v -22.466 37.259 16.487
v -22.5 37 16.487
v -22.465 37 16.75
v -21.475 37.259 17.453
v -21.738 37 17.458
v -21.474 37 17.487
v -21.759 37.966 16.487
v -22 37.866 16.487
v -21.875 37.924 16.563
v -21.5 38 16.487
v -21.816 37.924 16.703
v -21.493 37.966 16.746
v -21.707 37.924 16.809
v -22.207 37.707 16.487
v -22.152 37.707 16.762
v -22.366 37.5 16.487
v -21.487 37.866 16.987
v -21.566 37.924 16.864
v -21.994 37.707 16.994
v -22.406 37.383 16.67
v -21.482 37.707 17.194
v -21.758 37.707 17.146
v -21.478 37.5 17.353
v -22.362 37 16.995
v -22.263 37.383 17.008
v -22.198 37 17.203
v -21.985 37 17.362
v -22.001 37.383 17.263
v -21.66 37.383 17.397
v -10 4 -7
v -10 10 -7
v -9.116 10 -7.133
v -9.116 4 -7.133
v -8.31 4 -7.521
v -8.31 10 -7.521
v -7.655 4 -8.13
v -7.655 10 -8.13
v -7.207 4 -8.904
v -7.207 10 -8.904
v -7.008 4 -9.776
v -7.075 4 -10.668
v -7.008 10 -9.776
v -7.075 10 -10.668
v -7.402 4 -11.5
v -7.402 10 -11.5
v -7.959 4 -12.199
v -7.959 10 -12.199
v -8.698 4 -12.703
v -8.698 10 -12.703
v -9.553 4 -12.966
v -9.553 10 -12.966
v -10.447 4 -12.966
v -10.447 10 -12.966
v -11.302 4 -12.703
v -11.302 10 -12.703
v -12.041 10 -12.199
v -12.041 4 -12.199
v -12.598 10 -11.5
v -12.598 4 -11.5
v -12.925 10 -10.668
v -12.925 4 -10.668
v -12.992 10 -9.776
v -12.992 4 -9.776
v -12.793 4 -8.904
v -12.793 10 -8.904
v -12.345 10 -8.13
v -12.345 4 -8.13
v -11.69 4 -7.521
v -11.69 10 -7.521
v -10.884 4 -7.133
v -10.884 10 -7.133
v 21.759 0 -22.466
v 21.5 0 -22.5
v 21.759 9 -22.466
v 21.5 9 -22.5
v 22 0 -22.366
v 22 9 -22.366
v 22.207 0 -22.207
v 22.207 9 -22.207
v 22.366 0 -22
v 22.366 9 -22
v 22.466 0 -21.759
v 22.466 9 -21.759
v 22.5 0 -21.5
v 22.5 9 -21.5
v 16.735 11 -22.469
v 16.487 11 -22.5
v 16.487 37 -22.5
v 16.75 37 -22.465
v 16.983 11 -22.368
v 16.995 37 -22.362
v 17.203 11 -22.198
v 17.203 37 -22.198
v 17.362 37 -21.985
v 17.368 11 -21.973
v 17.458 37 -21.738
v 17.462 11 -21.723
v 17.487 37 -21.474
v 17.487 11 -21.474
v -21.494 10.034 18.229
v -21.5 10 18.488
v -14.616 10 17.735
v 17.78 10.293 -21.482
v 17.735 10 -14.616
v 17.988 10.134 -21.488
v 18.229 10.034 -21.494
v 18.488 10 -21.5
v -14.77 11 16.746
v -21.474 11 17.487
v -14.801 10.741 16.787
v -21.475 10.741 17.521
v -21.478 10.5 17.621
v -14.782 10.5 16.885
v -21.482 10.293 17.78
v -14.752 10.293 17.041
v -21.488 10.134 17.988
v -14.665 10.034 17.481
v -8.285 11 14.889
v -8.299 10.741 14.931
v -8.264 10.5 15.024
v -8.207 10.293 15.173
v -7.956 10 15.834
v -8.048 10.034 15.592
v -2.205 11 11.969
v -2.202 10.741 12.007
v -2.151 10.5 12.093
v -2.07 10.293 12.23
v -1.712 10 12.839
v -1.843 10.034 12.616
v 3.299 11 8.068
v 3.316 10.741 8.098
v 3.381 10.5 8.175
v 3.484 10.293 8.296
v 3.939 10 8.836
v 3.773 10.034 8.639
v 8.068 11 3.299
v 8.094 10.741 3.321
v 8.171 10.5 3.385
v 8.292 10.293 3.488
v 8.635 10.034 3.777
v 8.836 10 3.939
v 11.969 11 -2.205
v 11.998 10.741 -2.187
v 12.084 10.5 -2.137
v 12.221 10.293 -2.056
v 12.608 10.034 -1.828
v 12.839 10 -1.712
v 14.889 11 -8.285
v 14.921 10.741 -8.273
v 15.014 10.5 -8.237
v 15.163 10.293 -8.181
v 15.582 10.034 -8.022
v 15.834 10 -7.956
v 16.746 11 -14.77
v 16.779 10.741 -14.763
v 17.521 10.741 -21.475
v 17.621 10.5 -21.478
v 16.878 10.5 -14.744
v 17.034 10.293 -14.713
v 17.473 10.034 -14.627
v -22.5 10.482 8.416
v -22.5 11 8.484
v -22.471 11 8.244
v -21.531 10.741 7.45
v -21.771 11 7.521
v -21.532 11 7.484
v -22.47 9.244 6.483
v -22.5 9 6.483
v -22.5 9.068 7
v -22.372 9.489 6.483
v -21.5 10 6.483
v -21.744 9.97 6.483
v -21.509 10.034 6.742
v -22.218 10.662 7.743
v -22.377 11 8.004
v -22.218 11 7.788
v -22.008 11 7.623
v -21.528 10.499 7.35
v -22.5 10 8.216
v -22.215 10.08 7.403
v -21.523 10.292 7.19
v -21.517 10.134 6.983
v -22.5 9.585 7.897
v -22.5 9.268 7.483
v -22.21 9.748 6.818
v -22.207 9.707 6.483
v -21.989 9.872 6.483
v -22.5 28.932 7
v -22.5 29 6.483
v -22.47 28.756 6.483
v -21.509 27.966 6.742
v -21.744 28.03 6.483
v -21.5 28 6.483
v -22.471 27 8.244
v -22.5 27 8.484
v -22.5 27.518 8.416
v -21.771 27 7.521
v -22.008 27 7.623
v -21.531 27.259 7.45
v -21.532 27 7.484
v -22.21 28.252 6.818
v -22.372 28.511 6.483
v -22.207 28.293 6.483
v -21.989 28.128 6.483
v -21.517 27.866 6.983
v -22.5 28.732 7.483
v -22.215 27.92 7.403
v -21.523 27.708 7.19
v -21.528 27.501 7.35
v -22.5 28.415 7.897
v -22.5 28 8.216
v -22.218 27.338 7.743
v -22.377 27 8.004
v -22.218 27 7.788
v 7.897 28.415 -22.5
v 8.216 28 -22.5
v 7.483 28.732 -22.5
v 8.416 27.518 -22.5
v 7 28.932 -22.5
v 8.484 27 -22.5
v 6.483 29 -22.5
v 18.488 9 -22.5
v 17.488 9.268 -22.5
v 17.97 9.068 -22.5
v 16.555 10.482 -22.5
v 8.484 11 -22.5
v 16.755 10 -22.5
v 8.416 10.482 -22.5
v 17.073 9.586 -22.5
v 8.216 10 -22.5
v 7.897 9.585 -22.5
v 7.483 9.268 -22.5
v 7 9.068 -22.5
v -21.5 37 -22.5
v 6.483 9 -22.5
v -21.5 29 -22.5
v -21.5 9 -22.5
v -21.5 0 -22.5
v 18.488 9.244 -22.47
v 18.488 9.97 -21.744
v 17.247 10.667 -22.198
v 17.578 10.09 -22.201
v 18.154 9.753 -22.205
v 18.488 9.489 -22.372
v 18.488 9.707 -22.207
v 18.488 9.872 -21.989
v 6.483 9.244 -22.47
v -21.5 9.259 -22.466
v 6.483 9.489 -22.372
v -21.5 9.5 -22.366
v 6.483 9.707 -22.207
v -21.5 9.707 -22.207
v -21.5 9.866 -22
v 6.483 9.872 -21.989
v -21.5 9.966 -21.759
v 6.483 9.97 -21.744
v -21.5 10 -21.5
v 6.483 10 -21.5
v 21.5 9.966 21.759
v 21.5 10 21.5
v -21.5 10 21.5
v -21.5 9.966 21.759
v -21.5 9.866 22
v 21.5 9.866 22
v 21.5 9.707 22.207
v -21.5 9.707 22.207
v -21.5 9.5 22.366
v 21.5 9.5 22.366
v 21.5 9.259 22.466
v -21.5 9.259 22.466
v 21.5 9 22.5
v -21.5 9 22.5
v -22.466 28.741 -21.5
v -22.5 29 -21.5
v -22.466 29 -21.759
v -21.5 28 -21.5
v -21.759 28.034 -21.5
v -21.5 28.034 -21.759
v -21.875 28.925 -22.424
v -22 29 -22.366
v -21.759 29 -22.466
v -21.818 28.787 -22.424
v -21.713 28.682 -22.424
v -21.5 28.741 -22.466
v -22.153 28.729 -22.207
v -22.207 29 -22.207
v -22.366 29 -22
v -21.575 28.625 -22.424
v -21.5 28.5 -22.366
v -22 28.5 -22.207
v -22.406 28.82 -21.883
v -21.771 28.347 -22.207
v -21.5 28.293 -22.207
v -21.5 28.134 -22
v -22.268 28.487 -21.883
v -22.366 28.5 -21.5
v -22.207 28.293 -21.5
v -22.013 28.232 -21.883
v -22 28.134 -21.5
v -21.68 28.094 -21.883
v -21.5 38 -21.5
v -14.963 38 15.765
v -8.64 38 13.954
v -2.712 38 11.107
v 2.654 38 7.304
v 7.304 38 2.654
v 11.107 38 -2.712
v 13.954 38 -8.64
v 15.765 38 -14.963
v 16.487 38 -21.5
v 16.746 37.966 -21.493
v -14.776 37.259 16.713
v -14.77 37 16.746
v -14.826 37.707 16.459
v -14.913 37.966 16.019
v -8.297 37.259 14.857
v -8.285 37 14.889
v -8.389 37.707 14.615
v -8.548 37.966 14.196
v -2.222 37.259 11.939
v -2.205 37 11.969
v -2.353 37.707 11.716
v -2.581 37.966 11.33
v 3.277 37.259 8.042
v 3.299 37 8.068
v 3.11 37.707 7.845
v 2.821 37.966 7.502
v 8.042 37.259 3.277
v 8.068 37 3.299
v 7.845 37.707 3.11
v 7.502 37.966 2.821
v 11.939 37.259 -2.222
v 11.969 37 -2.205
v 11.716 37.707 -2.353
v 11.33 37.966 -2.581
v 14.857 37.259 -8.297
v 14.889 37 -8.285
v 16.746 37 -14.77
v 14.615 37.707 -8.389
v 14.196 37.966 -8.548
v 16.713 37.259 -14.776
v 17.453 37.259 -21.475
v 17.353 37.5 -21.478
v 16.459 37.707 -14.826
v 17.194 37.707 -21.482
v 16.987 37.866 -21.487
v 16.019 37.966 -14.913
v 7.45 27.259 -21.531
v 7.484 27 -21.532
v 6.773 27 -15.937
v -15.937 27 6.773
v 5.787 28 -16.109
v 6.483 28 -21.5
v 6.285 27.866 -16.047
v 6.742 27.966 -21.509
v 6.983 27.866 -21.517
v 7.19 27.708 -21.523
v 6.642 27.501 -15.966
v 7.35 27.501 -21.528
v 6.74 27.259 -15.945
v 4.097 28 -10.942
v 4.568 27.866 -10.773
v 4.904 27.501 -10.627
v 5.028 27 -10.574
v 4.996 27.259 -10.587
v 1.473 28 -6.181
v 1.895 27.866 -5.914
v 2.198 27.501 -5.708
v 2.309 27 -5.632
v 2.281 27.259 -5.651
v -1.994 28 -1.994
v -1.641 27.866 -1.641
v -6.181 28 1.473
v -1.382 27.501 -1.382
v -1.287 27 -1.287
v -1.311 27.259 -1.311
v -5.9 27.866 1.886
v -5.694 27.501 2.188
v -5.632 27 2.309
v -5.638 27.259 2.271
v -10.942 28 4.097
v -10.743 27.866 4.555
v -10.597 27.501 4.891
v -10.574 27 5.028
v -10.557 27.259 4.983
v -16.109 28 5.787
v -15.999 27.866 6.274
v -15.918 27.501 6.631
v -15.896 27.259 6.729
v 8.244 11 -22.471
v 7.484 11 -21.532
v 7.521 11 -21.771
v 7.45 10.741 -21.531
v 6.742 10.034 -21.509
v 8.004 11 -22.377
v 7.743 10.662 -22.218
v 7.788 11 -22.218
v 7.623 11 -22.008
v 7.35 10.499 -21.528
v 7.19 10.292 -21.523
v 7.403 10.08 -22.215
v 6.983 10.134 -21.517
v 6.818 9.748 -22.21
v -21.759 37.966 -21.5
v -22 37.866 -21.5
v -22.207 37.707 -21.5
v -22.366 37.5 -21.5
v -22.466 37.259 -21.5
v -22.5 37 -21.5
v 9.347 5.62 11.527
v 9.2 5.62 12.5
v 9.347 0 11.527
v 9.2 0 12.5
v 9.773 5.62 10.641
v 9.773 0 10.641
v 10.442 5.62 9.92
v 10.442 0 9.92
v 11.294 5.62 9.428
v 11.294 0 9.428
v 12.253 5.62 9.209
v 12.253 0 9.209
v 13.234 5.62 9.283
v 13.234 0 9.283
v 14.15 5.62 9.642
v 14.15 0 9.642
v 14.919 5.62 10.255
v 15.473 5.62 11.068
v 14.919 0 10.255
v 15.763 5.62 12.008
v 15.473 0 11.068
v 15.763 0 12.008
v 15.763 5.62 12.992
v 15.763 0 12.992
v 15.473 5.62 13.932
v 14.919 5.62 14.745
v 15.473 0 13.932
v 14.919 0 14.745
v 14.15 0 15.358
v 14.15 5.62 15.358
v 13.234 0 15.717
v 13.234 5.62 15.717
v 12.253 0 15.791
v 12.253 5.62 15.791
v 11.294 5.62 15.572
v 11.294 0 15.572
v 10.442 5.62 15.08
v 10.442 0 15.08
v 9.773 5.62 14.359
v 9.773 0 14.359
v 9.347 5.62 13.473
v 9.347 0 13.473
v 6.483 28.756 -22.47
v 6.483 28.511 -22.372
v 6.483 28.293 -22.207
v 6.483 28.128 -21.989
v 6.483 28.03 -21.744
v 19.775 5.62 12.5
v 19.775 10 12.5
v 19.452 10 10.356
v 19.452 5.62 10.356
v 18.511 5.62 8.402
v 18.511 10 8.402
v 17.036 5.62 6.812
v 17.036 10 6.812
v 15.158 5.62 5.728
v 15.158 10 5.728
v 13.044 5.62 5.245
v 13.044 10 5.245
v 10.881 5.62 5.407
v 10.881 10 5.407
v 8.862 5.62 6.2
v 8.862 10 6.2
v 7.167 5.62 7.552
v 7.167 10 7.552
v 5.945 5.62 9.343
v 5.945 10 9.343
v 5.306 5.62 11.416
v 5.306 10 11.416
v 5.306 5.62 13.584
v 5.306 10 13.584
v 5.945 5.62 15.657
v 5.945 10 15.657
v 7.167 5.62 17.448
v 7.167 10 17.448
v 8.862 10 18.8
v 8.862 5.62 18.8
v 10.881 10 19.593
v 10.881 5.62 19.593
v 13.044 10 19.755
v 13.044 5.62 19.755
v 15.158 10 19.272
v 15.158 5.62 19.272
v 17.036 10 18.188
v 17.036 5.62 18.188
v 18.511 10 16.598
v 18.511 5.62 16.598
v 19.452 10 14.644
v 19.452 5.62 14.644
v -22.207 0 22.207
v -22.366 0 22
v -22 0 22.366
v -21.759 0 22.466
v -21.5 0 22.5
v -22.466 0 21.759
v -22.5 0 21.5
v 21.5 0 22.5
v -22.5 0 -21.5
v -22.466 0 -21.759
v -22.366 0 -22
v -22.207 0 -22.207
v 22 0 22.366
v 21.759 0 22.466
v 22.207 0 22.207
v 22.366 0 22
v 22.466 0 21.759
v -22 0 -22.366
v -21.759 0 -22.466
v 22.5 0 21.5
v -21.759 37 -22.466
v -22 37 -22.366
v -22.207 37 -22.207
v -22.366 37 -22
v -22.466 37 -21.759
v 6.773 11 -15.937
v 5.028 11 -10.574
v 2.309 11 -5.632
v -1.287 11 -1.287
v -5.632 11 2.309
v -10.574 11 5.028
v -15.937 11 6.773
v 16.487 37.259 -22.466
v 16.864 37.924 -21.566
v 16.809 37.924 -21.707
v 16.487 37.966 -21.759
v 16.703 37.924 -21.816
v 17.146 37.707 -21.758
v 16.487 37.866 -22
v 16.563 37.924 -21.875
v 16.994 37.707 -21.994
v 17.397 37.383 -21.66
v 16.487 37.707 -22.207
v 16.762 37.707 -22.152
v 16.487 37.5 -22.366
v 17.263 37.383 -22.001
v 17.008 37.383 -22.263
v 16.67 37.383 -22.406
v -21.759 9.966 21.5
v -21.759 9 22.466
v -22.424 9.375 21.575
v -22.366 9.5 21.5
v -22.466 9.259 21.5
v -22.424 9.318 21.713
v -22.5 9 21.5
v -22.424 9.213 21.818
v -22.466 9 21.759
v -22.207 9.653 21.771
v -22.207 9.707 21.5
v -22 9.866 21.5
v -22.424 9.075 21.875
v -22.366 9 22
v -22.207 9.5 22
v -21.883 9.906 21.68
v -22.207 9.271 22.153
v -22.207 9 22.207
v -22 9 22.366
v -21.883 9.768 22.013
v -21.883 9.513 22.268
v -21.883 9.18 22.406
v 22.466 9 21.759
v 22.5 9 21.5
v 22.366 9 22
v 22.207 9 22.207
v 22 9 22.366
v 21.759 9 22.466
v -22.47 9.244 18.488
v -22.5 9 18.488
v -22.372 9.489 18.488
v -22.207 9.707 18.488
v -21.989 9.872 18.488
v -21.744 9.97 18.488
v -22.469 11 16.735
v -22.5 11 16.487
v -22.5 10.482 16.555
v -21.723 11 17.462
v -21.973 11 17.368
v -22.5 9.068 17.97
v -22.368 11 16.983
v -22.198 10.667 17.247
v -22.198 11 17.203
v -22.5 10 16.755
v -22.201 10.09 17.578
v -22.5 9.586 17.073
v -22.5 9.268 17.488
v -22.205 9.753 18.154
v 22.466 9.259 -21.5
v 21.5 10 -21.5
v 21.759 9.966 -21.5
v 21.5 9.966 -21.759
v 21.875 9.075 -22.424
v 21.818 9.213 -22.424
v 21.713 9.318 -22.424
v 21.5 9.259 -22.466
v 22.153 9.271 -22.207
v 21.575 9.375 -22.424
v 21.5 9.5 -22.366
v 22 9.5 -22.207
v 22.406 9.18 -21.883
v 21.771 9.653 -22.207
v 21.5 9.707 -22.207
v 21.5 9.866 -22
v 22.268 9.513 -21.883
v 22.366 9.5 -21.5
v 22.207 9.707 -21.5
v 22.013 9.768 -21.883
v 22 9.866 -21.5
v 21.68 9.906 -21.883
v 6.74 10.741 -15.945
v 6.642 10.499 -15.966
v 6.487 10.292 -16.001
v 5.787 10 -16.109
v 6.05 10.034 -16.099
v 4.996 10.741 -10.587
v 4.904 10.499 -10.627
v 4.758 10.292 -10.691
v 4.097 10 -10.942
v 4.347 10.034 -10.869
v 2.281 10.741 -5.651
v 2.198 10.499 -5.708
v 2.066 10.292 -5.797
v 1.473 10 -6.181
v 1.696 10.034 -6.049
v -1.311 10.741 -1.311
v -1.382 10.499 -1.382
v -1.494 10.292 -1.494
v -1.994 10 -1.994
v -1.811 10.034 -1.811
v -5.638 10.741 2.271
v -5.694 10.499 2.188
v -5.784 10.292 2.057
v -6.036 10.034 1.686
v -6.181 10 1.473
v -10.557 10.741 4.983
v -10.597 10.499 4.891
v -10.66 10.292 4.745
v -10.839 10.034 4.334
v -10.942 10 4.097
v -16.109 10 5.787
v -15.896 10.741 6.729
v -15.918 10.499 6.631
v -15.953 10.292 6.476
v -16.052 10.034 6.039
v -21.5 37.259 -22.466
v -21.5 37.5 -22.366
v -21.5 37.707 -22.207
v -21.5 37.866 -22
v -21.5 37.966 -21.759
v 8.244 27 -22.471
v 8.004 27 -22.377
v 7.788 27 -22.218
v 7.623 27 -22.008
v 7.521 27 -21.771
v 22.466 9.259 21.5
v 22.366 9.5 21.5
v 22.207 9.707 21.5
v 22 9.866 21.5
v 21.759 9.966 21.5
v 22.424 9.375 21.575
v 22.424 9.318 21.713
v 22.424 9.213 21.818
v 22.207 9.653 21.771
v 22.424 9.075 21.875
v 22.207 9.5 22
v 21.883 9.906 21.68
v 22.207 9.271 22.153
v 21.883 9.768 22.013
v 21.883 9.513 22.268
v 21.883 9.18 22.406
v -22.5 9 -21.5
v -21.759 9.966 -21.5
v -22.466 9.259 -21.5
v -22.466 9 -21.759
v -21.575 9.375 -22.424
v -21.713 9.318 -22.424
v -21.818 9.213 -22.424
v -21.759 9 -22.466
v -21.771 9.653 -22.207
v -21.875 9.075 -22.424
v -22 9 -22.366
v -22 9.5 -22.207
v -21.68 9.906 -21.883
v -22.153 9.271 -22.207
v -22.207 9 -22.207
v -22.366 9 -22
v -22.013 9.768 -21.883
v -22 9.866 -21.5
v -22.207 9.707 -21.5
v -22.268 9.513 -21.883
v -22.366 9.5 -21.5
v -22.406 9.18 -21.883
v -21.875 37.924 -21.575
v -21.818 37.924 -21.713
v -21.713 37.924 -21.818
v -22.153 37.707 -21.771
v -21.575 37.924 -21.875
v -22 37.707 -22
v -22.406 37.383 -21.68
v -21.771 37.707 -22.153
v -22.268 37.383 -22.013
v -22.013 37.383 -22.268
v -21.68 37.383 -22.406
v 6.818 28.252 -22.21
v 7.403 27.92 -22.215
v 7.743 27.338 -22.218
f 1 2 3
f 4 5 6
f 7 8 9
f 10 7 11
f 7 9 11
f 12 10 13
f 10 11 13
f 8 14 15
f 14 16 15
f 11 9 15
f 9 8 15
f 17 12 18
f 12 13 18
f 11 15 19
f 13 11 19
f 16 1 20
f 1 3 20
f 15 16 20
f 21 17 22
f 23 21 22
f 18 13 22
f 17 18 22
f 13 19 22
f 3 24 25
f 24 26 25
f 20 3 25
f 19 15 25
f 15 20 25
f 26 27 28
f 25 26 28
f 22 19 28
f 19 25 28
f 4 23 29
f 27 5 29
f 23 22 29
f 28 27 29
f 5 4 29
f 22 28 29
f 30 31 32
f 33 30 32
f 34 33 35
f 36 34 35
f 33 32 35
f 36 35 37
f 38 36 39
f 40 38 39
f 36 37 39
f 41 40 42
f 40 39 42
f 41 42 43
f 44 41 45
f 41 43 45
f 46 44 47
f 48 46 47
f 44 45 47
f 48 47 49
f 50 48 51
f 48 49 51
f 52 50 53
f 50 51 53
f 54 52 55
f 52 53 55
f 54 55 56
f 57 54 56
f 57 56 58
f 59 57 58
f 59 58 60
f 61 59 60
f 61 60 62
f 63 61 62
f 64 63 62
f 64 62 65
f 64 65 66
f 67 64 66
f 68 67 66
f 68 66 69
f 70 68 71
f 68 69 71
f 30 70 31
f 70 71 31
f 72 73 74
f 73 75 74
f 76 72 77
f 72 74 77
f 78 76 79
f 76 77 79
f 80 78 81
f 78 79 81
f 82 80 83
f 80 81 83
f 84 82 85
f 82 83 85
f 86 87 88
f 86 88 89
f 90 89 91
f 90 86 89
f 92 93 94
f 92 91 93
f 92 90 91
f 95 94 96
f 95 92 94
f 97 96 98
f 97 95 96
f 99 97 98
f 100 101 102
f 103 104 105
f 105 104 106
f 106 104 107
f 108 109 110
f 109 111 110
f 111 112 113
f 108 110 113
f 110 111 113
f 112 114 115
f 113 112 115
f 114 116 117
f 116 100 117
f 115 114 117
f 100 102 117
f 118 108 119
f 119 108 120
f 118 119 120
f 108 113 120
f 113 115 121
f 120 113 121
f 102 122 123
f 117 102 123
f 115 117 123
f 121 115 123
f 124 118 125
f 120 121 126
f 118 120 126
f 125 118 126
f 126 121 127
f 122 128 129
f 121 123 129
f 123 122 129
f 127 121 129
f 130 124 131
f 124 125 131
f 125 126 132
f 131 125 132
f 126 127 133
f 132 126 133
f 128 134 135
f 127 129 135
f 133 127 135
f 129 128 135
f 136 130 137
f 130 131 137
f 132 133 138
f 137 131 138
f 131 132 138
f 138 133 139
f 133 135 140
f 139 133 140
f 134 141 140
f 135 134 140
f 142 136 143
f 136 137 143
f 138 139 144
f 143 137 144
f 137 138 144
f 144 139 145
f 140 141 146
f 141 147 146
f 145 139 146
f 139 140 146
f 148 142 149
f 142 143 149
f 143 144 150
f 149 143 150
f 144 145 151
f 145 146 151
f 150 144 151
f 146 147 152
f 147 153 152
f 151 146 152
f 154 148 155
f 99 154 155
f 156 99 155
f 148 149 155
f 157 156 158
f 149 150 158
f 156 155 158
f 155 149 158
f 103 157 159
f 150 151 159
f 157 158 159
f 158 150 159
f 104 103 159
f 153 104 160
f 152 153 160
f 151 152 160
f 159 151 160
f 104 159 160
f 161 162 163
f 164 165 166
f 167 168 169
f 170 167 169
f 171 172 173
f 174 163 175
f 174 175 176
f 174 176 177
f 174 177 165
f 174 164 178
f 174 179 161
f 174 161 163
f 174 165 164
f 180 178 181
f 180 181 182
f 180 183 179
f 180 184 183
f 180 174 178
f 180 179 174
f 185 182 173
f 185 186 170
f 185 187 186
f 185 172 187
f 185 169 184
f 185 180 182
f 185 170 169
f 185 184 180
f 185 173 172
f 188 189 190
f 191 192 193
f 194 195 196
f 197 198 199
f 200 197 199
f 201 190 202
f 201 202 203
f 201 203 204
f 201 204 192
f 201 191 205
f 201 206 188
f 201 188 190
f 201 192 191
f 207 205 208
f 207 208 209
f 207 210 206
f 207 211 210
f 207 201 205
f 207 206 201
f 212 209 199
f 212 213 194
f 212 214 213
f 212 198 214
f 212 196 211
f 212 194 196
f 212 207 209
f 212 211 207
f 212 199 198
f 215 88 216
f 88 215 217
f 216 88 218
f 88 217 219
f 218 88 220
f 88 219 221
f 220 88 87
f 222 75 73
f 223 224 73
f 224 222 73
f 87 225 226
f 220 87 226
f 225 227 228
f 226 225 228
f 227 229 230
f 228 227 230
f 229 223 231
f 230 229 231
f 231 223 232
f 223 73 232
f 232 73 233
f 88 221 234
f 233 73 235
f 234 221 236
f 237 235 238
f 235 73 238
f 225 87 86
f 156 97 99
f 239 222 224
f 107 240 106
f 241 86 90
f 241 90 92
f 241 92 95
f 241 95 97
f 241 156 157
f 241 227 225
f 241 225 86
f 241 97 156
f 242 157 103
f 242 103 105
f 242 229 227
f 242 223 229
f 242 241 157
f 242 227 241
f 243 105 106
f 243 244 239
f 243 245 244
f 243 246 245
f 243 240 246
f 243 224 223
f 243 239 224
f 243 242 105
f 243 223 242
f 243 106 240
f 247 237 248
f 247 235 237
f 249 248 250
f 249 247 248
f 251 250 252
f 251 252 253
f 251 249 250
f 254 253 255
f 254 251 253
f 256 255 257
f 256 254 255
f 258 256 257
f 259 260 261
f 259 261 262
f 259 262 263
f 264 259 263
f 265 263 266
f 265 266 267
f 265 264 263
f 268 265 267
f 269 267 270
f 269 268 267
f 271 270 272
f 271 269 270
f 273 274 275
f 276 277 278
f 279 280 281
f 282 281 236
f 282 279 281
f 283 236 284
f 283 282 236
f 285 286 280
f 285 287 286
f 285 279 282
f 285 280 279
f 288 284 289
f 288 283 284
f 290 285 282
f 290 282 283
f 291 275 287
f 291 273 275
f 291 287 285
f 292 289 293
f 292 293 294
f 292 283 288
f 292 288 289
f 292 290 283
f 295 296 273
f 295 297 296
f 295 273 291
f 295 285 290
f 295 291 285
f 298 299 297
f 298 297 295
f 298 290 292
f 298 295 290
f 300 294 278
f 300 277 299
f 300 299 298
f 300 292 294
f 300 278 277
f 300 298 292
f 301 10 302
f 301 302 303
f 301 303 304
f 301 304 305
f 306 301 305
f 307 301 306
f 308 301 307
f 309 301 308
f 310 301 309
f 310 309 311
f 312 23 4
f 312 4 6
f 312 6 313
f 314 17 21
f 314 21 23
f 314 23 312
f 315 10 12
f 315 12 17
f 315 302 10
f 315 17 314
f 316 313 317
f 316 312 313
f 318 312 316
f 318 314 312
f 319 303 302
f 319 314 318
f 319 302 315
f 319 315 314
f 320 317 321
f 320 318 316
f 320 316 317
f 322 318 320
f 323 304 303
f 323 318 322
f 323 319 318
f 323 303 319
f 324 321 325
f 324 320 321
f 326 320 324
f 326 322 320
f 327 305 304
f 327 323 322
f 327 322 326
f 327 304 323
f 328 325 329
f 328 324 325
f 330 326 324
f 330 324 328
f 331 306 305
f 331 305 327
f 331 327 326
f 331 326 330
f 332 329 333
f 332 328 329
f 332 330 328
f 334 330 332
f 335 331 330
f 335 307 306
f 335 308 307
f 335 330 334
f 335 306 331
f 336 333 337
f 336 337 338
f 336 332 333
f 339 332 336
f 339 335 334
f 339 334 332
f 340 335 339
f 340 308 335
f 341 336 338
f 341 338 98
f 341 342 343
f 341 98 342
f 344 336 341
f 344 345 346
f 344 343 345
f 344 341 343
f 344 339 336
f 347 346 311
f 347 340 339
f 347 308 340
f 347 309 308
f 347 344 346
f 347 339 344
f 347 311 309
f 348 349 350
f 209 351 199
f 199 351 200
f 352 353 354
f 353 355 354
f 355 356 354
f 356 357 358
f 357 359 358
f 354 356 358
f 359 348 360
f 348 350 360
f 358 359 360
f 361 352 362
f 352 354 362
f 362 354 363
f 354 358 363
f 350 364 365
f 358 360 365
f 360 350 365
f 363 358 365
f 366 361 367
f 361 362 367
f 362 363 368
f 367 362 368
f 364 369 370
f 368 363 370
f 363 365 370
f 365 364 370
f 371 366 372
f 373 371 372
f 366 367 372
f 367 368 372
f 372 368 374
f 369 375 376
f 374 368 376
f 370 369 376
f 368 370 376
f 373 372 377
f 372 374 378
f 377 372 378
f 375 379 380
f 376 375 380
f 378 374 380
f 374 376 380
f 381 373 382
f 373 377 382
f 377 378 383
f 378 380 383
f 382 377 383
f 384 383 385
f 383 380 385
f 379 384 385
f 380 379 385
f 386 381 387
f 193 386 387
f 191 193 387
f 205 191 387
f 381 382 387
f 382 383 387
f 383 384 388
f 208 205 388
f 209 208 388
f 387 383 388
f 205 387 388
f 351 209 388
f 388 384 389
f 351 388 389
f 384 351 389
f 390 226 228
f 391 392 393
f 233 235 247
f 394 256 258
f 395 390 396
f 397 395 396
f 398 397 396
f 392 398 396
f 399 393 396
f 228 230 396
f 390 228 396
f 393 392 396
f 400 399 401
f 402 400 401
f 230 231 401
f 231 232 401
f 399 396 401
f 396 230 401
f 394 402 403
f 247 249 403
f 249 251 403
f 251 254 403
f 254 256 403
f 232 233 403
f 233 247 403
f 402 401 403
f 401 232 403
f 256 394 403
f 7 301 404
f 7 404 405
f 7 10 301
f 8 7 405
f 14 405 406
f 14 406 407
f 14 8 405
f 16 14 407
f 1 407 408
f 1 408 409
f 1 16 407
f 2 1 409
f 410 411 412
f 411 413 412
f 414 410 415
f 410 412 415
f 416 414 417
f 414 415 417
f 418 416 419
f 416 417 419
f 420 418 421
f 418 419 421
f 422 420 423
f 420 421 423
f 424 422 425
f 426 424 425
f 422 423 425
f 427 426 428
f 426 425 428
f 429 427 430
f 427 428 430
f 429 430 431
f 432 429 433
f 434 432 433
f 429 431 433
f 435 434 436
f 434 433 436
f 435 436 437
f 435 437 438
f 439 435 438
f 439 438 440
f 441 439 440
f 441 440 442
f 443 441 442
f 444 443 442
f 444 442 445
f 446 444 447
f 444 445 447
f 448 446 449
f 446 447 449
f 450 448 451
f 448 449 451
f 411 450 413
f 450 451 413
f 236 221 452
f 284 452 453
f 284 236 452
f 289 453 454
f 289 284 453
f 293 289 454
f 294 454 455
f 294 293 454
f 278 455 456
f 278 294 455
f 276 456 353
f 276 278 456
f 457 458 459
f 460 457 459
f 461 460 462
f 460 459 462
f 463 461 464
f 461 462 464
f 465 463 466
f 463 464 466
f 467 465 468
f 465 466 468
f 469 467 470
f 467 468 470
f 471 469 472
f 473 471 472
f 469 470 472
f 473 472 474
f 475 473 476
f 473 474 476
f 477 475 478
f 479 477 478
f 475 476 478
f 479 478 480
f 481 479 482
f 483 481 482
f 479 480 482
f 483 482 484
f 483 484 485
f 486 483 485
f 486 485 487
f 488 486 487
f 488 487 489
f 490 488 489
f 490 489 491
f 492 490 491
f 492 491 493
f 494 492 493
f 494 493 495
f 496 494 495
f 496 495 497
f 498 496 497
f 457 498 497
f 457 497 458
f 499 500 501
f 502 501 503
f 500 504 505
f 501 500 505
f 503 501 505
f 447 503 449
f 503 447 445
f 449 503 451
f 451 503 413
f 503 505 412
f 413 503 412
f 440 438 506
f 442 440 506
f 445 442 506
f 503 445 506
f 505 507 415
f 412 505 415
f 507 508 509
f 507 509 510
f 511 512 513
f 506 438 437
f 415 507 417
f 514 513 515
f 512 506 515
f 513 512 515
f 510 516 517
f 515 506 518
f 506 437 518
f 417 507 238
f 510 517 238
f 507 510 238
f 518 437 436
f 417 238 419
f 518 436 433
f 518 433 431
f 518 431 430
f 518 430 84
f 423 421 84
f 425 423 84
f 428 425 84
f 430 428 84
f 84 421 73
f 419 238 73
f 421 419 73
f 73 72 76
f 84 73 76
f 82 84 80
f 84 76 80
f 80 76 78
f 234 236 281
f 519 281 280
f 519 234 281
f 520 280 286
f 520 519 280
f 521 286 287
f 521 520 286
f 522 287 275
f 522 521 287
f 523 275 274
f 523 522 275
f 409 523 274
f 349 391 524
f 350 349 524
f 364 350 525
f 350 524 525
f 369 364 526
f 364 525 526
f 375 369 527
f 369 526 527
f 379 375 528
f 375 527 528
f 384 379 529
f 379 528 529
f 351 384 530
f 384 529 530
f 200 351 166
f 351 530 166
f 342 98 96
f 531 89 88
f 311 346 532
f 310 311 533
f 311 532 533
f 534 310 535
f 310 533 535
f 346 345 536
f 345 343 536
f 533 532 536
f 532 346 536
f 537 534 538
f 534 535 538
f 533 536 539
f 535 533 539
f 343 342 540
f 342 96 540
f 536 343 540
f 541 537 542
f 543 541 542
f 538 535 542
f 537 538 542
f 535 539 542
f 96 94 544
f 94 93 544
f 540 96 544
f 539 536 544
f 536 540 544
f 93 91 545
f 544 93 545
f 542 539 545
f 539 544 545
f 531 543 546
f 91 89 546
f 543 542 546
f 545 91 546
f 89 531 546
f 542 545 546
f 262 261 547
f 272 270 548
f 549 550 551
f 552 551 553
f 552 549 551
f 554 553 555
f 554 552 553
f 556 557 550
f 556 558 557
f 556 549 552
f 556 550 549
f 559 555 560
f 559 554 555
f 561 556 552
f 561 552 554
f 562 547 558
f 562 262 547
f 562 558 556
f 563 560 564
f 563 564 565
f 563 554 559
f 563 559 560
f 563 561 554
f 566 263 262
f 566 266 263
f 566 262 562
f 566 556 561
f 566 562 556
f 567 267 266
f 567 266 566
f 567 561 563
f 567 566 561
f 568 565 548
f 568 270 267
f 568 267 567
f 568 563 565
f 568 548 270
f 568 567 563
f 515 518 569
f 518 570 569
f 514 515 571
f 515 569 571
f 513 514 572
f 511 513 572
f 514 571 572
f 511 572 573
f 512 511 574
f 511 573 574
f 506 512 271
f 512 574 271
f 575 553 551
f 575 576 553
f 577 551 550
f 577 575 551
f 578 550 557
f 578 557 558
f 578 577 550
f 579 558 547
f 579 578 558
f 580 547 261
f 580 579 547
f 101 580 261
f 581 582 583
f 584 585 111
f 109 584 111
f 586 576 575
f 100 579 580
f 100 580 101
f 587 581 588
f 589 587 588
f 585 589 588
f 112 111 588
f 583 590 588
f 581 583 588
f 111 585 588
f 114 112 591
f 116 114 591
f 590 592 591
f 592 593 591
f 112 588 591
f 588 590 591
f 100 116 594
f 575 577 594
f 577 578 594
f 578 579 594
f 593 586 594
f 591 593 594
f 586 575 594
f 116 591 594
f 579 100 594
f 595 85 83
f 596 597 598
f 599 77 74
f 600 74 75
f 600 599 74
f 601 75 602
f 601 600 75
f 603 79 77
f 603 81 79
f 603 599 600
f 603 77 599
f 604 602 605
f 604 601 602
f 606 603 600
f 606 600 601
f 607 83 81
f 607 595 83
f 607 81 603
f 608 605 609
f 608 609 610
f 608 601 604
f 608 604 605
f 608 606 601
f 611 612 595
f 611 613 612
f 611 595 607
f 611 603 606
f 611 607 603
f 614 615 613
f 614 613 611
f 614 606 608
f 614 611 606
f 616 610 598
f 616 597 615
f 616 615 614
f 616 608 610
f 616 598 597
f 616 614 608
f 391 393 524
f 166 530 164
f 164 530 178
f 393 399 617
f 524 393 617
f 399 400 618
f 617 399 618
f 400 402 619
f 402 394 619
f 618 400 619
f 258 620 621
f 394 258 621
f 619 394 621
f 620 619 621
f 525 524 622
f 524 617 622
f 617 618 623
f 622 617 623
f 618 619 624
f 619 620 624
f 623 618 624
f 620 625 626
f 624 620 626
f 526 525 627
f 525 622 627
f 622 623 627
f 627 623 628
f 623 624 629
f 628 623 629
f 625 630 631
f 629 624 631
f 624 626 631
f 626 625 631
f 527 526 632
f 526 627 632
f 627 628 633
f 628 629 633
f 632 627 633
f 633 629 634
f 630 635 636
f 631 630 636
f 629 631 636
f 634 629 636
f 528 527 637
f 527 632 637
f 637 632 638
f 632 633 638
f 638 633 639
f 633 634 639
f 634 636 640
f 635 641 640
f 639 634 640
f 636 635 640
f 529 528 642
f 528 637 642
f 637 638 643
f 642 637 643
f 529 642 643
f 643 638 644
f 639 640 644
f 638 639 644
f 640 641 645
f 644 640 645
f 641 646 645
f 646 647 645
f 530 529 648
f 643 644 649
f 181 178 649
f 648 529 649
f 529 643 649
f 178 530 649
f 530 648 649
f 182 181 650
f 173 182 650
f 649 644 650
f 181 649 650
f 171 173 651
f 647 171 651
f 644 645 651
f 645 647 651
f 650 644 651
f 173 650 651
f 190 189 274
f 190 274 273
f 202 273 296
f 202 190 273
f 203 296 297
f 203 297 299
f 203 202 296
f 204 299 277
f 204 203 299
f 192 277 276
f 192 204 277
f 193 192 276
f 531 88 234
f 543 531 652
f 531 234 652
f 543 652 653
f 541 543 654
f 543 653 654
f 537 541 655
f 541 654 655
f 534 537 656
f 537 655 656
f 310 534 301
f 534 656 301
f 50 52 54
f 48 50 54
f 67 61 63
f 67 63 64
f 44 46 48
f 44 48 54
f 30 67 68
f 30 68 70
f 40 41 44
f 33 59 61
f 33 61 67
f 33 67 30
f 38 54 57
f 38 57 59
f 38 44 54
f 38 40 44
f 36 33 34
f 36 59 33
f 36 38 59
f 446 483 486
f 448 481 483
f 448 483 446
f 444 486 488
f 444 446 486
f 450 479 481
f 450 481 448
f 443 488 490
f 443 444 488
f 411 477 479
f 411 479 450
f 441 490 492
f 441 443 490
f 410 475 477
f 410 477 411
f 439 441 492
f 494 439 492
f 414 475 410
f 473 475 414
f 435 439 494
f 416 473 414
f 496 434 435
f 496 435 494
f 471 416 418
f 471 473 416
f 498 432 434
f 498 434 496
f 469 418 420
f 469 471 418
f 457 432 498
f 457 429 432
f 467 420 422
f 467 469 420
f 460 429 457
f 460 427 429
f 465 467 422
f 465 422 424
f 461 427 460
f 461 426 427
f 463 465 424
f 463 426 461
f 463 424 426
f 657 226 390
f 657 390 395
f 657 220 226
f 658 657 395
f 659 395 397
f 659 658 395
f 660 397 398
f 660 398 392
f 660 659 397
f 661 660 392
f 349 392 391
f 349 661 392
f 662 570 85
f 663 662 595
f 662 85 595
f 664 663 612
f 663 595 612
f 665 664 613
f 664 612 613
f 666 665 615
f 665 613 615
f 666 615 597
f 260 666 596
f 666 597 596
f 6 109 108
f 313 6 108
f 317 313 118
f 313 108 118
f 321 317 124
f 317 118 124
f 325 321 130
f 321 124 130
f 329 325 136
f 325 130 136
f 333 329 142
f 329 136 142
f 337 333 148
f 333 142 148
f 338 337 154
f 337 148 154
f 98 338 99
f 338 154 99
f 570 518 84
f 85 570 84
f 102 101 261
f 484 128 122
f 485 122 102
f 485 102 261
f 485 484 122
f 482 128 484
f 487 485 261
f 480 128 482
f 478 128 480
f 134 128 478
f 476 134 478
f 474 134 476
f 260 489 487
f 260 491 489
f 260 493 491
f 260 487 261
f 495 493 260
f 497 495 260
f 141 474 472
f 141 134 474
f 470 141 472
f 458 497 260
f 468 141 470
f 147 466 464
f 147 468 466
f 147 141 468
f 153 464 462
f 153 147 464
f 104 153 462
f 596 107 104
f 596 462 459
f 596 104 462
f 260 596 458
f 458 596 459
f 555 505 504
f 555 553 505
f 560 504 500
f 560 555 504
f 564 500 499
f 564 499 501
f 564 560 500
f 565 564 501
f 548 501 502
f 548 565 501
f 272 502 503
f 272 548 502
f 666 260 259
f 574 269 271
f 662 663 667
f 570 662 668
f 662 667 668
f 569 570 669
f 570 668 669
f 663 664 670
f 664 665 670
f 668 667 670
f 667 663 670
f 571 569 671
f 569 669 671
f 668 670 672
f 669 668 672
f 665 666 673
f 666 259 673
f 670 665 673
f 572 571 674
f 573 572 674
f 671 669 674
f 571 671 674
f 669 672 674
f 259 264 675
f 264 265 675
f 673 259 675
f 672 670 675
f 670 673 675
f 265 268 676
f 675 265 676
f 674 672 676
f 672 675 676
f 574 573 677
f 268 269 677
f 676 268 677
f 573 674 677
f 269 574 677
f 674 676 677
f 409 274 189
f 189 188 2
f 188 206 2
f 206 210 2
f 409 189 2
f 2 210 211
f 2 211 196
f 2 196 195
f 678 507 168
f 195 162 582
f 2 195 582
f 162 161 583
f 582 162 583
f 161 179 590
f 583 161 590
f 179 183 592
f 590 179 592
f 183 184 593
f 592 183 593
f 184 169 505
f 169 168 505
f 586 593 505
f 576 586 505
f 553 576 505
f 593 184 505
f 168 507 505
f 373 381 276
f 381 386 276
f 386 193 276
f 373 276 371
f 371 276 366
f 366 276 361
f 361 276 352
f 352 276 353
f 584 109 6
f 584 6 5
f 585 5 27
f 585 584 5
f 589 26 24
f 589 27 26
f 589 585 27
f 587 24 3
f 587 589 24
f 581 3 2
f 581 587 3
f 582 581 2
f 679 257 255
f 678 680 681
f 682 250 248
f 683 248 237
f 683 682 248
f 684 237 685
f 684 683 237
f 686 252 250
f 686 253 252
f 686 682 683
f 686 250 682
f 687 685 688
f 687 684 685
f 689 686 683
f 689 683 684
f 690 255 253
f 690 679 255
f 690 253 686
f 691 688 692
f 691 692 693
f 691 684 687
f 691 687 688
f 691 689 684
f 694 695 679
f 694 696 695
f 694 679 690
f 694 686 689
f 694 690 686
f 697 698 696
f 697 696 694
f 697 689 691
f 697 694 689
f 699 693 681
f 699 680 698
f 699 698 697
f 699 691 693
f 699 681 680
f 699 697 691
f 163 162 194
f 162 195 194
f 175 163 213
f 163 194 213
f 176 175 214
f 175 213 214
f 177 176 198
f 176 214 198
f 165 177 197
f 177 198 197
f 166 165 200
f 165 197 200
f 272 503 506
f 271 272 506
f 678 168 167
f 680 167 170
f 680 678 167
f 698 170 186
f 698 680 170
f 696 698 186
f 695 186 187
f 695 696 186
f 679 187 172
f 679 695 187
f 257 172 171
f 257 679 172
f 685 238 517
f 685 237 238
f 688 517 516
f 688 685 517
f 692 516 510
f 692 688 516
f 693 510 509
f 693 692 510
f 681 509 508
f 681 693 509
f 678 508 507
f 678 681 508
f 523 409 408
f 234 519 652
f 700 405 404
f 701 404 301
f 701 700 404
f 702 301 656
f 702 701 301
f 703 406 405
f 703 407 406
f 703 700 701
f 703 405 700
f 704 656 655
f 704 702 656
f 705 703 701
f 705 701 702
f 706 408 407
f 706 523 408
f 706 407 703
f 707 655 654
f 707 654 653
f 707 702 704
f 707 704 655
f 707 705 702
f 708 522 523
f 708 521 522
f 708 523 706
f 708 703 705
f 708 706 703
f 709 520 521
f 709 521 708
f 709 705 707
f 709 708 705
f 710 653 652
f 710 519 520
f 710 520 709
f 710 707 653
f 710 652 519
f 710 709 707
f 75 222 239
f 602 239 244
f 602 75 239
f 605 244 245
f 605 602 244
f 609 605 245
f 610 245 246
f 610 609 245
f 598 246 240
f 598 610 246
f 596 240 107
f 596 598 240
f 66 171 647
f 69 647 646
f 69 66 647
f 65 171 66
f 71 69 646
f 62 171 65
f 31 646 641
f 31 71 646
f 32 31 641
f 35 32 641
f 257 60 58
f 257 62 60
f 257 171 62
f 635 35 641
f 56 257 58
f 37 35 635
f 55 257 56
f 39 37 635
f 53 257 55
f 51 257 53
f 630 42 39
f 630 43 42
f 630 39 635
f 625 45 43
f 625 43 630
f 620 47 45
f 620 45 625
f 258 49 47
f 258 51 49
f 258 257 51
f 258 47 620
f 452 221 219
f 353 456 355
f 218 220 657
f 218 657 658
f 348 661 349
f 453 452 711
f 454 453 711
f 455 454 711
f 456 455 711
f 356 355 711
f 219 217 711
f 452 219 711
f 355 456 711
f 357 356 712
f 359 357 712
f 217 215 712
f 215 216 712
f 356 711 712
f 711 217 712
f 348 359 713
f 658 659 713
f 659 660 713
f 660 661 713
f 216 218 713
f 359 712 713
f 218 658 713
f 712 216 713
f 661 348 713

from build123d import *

# Parameters (mm, degrees)
SKETCH3_W                               = 45
SKETCH3_H                               = 45
BOSS_EXTRUDE1_DEPTH                     = 10
CBORE_FOR_M6_HEX_HEAD_BOLT1_D           = 6.6
CBORE_FOR_M6_HEX_HEAD_BOLT1_CBORE_D     = 14.55
CBORE_FOR_M6_HEX_HEAD_BOLT1_CBORE_DEPTH = 4.38
BOSS_EXTRUDE3_DEPTH                     = 18
BOSS_EXTRUDE4_DEPTH                     = 10
SKETCH10_R                              = 3
CUT_EXTRUDE2_DEPTH                      = 6
FILLET2_R                               = 1


with BuildPart() as part:
    # Sketch3 → Boss-Extrude1 (new body)
    with BuildSketch(Plane(origin=(0, 0, 0), x_dir=(1, 0, 0), z_dir=(0, 1, 0))):
        Rectangle(SKETCH3_W, SKETCH3_H)
    extrude(amount=BOSS_EXTRUDE1_DEPTH)

    # CBORE for M6 Hex Head Bolt1 (through all)
    with Locations(Plane(origin=(0, 10, 0), x_dir=(1, 0, 0), z_dir=(0, 1, 0))):
        with Locations((12.5, -12.5)):
            CounterBoreHole(CBORE_FOR_M6_HEX_HEAD_BOLT1_D / 2, CBORE_FOR_M6_HEX_HEAD_BOLT1_CBORE_D / 2, CBORE_FOR_M6_HEX_HEAD_BOLT1_CBORE_DEPTH)

    # Sketch8 → Boss-Extrude3 (add)
    with BuildSketch(Plane(origin=(0, 10, 0), x_dir=(1, 0, 0), z_dir=(0, 1, 0))):
        with BuildLine():
            Line((17.5, 22.5), (7.5, 22.5))
            ThreePointArc((7.5, 22.5), (-1.286796564, 1.286796564), (-22.5, -7.5))
            Line((-22.5, -7.5), (-22.5, -17.5))
            ThreePointArc((-22.5, -17.5), (5.784271247, -5.784271247), (17.5, 22.5))
        make_face()
    extrude(amount=BOSS_EXTRUDE3_DEPTH)

    # Sketch9 → Boss-Extrude4 (add)
    with BuildSketch(Plane(origin=(0, 28, 0), x_dir=(1, 0, 0), z_dir=(0, 1, 0))):
        with BuildLine():
            Line((17.5, 22.5), (-22.5, 22.5))
            Line((-22.5, 22.5), (-22.5, -17.5))
            ThreePointArc((-22.5, -17.5), (5.784271247, -5.784271247), (17.5, 22.5))
        make_face()
    extrude(amount=BOSS_EXTRUDE4_DEPTH)

    # Sketch10 → Cut-Extrude2 (cut)
    with BuildSketch(Plane(origin=(0, 10, 0), x_dir=(1, 0, 0), z_dir=(0, 1, 0))):
        with Locations(Location((-10, 10, 0), (0, 0, 270))):
            Circle(SKETCH10_R)
    extrude(amount=-CUT_EXTRUDE2_DEPTH, mode=Mode.SUBTRACT)

    # Fillet2
    fillet2_edges = [part.edges().sort_by_distance(p)[0] for p in [
        (-22.5, 10, -7.5),
        (0, 10, 22.5),
        (-7.5, 10, -22.5),
        (-22.5, 10, 20),
        (5.784271247, 10, 5.784271247),
        (-22.5, 24, 17.5),
        (17.5, 24, -22.5),
        (-1.286796564, 10, -1.286796564),
        (7.5, 19, -22.5),
        (-22.5, 19, 7.5),
        (-1.286796564, 28, -1.286796564),
        (-22.5, 28, -7.5),
        (-22.5, 33, -22.5),
        (-7.5, 28, -22.5),
        (-22.5, 38, -2.5),
        (5.784271247, 38, 5.784271247),
        (-2.5, 38, -22.5),
        (22.5, 10, 0),
        (22.5, 5, 22.5),
        (-22.5, 5, 22.5),
        (-22.5, 5, -22.5),
        (22.5, 5, -22.5),
        (20, 10, -22.5),
    ]]
    fillet(fillet2_edges, radius=FILLET2_R)


solid = part.part
